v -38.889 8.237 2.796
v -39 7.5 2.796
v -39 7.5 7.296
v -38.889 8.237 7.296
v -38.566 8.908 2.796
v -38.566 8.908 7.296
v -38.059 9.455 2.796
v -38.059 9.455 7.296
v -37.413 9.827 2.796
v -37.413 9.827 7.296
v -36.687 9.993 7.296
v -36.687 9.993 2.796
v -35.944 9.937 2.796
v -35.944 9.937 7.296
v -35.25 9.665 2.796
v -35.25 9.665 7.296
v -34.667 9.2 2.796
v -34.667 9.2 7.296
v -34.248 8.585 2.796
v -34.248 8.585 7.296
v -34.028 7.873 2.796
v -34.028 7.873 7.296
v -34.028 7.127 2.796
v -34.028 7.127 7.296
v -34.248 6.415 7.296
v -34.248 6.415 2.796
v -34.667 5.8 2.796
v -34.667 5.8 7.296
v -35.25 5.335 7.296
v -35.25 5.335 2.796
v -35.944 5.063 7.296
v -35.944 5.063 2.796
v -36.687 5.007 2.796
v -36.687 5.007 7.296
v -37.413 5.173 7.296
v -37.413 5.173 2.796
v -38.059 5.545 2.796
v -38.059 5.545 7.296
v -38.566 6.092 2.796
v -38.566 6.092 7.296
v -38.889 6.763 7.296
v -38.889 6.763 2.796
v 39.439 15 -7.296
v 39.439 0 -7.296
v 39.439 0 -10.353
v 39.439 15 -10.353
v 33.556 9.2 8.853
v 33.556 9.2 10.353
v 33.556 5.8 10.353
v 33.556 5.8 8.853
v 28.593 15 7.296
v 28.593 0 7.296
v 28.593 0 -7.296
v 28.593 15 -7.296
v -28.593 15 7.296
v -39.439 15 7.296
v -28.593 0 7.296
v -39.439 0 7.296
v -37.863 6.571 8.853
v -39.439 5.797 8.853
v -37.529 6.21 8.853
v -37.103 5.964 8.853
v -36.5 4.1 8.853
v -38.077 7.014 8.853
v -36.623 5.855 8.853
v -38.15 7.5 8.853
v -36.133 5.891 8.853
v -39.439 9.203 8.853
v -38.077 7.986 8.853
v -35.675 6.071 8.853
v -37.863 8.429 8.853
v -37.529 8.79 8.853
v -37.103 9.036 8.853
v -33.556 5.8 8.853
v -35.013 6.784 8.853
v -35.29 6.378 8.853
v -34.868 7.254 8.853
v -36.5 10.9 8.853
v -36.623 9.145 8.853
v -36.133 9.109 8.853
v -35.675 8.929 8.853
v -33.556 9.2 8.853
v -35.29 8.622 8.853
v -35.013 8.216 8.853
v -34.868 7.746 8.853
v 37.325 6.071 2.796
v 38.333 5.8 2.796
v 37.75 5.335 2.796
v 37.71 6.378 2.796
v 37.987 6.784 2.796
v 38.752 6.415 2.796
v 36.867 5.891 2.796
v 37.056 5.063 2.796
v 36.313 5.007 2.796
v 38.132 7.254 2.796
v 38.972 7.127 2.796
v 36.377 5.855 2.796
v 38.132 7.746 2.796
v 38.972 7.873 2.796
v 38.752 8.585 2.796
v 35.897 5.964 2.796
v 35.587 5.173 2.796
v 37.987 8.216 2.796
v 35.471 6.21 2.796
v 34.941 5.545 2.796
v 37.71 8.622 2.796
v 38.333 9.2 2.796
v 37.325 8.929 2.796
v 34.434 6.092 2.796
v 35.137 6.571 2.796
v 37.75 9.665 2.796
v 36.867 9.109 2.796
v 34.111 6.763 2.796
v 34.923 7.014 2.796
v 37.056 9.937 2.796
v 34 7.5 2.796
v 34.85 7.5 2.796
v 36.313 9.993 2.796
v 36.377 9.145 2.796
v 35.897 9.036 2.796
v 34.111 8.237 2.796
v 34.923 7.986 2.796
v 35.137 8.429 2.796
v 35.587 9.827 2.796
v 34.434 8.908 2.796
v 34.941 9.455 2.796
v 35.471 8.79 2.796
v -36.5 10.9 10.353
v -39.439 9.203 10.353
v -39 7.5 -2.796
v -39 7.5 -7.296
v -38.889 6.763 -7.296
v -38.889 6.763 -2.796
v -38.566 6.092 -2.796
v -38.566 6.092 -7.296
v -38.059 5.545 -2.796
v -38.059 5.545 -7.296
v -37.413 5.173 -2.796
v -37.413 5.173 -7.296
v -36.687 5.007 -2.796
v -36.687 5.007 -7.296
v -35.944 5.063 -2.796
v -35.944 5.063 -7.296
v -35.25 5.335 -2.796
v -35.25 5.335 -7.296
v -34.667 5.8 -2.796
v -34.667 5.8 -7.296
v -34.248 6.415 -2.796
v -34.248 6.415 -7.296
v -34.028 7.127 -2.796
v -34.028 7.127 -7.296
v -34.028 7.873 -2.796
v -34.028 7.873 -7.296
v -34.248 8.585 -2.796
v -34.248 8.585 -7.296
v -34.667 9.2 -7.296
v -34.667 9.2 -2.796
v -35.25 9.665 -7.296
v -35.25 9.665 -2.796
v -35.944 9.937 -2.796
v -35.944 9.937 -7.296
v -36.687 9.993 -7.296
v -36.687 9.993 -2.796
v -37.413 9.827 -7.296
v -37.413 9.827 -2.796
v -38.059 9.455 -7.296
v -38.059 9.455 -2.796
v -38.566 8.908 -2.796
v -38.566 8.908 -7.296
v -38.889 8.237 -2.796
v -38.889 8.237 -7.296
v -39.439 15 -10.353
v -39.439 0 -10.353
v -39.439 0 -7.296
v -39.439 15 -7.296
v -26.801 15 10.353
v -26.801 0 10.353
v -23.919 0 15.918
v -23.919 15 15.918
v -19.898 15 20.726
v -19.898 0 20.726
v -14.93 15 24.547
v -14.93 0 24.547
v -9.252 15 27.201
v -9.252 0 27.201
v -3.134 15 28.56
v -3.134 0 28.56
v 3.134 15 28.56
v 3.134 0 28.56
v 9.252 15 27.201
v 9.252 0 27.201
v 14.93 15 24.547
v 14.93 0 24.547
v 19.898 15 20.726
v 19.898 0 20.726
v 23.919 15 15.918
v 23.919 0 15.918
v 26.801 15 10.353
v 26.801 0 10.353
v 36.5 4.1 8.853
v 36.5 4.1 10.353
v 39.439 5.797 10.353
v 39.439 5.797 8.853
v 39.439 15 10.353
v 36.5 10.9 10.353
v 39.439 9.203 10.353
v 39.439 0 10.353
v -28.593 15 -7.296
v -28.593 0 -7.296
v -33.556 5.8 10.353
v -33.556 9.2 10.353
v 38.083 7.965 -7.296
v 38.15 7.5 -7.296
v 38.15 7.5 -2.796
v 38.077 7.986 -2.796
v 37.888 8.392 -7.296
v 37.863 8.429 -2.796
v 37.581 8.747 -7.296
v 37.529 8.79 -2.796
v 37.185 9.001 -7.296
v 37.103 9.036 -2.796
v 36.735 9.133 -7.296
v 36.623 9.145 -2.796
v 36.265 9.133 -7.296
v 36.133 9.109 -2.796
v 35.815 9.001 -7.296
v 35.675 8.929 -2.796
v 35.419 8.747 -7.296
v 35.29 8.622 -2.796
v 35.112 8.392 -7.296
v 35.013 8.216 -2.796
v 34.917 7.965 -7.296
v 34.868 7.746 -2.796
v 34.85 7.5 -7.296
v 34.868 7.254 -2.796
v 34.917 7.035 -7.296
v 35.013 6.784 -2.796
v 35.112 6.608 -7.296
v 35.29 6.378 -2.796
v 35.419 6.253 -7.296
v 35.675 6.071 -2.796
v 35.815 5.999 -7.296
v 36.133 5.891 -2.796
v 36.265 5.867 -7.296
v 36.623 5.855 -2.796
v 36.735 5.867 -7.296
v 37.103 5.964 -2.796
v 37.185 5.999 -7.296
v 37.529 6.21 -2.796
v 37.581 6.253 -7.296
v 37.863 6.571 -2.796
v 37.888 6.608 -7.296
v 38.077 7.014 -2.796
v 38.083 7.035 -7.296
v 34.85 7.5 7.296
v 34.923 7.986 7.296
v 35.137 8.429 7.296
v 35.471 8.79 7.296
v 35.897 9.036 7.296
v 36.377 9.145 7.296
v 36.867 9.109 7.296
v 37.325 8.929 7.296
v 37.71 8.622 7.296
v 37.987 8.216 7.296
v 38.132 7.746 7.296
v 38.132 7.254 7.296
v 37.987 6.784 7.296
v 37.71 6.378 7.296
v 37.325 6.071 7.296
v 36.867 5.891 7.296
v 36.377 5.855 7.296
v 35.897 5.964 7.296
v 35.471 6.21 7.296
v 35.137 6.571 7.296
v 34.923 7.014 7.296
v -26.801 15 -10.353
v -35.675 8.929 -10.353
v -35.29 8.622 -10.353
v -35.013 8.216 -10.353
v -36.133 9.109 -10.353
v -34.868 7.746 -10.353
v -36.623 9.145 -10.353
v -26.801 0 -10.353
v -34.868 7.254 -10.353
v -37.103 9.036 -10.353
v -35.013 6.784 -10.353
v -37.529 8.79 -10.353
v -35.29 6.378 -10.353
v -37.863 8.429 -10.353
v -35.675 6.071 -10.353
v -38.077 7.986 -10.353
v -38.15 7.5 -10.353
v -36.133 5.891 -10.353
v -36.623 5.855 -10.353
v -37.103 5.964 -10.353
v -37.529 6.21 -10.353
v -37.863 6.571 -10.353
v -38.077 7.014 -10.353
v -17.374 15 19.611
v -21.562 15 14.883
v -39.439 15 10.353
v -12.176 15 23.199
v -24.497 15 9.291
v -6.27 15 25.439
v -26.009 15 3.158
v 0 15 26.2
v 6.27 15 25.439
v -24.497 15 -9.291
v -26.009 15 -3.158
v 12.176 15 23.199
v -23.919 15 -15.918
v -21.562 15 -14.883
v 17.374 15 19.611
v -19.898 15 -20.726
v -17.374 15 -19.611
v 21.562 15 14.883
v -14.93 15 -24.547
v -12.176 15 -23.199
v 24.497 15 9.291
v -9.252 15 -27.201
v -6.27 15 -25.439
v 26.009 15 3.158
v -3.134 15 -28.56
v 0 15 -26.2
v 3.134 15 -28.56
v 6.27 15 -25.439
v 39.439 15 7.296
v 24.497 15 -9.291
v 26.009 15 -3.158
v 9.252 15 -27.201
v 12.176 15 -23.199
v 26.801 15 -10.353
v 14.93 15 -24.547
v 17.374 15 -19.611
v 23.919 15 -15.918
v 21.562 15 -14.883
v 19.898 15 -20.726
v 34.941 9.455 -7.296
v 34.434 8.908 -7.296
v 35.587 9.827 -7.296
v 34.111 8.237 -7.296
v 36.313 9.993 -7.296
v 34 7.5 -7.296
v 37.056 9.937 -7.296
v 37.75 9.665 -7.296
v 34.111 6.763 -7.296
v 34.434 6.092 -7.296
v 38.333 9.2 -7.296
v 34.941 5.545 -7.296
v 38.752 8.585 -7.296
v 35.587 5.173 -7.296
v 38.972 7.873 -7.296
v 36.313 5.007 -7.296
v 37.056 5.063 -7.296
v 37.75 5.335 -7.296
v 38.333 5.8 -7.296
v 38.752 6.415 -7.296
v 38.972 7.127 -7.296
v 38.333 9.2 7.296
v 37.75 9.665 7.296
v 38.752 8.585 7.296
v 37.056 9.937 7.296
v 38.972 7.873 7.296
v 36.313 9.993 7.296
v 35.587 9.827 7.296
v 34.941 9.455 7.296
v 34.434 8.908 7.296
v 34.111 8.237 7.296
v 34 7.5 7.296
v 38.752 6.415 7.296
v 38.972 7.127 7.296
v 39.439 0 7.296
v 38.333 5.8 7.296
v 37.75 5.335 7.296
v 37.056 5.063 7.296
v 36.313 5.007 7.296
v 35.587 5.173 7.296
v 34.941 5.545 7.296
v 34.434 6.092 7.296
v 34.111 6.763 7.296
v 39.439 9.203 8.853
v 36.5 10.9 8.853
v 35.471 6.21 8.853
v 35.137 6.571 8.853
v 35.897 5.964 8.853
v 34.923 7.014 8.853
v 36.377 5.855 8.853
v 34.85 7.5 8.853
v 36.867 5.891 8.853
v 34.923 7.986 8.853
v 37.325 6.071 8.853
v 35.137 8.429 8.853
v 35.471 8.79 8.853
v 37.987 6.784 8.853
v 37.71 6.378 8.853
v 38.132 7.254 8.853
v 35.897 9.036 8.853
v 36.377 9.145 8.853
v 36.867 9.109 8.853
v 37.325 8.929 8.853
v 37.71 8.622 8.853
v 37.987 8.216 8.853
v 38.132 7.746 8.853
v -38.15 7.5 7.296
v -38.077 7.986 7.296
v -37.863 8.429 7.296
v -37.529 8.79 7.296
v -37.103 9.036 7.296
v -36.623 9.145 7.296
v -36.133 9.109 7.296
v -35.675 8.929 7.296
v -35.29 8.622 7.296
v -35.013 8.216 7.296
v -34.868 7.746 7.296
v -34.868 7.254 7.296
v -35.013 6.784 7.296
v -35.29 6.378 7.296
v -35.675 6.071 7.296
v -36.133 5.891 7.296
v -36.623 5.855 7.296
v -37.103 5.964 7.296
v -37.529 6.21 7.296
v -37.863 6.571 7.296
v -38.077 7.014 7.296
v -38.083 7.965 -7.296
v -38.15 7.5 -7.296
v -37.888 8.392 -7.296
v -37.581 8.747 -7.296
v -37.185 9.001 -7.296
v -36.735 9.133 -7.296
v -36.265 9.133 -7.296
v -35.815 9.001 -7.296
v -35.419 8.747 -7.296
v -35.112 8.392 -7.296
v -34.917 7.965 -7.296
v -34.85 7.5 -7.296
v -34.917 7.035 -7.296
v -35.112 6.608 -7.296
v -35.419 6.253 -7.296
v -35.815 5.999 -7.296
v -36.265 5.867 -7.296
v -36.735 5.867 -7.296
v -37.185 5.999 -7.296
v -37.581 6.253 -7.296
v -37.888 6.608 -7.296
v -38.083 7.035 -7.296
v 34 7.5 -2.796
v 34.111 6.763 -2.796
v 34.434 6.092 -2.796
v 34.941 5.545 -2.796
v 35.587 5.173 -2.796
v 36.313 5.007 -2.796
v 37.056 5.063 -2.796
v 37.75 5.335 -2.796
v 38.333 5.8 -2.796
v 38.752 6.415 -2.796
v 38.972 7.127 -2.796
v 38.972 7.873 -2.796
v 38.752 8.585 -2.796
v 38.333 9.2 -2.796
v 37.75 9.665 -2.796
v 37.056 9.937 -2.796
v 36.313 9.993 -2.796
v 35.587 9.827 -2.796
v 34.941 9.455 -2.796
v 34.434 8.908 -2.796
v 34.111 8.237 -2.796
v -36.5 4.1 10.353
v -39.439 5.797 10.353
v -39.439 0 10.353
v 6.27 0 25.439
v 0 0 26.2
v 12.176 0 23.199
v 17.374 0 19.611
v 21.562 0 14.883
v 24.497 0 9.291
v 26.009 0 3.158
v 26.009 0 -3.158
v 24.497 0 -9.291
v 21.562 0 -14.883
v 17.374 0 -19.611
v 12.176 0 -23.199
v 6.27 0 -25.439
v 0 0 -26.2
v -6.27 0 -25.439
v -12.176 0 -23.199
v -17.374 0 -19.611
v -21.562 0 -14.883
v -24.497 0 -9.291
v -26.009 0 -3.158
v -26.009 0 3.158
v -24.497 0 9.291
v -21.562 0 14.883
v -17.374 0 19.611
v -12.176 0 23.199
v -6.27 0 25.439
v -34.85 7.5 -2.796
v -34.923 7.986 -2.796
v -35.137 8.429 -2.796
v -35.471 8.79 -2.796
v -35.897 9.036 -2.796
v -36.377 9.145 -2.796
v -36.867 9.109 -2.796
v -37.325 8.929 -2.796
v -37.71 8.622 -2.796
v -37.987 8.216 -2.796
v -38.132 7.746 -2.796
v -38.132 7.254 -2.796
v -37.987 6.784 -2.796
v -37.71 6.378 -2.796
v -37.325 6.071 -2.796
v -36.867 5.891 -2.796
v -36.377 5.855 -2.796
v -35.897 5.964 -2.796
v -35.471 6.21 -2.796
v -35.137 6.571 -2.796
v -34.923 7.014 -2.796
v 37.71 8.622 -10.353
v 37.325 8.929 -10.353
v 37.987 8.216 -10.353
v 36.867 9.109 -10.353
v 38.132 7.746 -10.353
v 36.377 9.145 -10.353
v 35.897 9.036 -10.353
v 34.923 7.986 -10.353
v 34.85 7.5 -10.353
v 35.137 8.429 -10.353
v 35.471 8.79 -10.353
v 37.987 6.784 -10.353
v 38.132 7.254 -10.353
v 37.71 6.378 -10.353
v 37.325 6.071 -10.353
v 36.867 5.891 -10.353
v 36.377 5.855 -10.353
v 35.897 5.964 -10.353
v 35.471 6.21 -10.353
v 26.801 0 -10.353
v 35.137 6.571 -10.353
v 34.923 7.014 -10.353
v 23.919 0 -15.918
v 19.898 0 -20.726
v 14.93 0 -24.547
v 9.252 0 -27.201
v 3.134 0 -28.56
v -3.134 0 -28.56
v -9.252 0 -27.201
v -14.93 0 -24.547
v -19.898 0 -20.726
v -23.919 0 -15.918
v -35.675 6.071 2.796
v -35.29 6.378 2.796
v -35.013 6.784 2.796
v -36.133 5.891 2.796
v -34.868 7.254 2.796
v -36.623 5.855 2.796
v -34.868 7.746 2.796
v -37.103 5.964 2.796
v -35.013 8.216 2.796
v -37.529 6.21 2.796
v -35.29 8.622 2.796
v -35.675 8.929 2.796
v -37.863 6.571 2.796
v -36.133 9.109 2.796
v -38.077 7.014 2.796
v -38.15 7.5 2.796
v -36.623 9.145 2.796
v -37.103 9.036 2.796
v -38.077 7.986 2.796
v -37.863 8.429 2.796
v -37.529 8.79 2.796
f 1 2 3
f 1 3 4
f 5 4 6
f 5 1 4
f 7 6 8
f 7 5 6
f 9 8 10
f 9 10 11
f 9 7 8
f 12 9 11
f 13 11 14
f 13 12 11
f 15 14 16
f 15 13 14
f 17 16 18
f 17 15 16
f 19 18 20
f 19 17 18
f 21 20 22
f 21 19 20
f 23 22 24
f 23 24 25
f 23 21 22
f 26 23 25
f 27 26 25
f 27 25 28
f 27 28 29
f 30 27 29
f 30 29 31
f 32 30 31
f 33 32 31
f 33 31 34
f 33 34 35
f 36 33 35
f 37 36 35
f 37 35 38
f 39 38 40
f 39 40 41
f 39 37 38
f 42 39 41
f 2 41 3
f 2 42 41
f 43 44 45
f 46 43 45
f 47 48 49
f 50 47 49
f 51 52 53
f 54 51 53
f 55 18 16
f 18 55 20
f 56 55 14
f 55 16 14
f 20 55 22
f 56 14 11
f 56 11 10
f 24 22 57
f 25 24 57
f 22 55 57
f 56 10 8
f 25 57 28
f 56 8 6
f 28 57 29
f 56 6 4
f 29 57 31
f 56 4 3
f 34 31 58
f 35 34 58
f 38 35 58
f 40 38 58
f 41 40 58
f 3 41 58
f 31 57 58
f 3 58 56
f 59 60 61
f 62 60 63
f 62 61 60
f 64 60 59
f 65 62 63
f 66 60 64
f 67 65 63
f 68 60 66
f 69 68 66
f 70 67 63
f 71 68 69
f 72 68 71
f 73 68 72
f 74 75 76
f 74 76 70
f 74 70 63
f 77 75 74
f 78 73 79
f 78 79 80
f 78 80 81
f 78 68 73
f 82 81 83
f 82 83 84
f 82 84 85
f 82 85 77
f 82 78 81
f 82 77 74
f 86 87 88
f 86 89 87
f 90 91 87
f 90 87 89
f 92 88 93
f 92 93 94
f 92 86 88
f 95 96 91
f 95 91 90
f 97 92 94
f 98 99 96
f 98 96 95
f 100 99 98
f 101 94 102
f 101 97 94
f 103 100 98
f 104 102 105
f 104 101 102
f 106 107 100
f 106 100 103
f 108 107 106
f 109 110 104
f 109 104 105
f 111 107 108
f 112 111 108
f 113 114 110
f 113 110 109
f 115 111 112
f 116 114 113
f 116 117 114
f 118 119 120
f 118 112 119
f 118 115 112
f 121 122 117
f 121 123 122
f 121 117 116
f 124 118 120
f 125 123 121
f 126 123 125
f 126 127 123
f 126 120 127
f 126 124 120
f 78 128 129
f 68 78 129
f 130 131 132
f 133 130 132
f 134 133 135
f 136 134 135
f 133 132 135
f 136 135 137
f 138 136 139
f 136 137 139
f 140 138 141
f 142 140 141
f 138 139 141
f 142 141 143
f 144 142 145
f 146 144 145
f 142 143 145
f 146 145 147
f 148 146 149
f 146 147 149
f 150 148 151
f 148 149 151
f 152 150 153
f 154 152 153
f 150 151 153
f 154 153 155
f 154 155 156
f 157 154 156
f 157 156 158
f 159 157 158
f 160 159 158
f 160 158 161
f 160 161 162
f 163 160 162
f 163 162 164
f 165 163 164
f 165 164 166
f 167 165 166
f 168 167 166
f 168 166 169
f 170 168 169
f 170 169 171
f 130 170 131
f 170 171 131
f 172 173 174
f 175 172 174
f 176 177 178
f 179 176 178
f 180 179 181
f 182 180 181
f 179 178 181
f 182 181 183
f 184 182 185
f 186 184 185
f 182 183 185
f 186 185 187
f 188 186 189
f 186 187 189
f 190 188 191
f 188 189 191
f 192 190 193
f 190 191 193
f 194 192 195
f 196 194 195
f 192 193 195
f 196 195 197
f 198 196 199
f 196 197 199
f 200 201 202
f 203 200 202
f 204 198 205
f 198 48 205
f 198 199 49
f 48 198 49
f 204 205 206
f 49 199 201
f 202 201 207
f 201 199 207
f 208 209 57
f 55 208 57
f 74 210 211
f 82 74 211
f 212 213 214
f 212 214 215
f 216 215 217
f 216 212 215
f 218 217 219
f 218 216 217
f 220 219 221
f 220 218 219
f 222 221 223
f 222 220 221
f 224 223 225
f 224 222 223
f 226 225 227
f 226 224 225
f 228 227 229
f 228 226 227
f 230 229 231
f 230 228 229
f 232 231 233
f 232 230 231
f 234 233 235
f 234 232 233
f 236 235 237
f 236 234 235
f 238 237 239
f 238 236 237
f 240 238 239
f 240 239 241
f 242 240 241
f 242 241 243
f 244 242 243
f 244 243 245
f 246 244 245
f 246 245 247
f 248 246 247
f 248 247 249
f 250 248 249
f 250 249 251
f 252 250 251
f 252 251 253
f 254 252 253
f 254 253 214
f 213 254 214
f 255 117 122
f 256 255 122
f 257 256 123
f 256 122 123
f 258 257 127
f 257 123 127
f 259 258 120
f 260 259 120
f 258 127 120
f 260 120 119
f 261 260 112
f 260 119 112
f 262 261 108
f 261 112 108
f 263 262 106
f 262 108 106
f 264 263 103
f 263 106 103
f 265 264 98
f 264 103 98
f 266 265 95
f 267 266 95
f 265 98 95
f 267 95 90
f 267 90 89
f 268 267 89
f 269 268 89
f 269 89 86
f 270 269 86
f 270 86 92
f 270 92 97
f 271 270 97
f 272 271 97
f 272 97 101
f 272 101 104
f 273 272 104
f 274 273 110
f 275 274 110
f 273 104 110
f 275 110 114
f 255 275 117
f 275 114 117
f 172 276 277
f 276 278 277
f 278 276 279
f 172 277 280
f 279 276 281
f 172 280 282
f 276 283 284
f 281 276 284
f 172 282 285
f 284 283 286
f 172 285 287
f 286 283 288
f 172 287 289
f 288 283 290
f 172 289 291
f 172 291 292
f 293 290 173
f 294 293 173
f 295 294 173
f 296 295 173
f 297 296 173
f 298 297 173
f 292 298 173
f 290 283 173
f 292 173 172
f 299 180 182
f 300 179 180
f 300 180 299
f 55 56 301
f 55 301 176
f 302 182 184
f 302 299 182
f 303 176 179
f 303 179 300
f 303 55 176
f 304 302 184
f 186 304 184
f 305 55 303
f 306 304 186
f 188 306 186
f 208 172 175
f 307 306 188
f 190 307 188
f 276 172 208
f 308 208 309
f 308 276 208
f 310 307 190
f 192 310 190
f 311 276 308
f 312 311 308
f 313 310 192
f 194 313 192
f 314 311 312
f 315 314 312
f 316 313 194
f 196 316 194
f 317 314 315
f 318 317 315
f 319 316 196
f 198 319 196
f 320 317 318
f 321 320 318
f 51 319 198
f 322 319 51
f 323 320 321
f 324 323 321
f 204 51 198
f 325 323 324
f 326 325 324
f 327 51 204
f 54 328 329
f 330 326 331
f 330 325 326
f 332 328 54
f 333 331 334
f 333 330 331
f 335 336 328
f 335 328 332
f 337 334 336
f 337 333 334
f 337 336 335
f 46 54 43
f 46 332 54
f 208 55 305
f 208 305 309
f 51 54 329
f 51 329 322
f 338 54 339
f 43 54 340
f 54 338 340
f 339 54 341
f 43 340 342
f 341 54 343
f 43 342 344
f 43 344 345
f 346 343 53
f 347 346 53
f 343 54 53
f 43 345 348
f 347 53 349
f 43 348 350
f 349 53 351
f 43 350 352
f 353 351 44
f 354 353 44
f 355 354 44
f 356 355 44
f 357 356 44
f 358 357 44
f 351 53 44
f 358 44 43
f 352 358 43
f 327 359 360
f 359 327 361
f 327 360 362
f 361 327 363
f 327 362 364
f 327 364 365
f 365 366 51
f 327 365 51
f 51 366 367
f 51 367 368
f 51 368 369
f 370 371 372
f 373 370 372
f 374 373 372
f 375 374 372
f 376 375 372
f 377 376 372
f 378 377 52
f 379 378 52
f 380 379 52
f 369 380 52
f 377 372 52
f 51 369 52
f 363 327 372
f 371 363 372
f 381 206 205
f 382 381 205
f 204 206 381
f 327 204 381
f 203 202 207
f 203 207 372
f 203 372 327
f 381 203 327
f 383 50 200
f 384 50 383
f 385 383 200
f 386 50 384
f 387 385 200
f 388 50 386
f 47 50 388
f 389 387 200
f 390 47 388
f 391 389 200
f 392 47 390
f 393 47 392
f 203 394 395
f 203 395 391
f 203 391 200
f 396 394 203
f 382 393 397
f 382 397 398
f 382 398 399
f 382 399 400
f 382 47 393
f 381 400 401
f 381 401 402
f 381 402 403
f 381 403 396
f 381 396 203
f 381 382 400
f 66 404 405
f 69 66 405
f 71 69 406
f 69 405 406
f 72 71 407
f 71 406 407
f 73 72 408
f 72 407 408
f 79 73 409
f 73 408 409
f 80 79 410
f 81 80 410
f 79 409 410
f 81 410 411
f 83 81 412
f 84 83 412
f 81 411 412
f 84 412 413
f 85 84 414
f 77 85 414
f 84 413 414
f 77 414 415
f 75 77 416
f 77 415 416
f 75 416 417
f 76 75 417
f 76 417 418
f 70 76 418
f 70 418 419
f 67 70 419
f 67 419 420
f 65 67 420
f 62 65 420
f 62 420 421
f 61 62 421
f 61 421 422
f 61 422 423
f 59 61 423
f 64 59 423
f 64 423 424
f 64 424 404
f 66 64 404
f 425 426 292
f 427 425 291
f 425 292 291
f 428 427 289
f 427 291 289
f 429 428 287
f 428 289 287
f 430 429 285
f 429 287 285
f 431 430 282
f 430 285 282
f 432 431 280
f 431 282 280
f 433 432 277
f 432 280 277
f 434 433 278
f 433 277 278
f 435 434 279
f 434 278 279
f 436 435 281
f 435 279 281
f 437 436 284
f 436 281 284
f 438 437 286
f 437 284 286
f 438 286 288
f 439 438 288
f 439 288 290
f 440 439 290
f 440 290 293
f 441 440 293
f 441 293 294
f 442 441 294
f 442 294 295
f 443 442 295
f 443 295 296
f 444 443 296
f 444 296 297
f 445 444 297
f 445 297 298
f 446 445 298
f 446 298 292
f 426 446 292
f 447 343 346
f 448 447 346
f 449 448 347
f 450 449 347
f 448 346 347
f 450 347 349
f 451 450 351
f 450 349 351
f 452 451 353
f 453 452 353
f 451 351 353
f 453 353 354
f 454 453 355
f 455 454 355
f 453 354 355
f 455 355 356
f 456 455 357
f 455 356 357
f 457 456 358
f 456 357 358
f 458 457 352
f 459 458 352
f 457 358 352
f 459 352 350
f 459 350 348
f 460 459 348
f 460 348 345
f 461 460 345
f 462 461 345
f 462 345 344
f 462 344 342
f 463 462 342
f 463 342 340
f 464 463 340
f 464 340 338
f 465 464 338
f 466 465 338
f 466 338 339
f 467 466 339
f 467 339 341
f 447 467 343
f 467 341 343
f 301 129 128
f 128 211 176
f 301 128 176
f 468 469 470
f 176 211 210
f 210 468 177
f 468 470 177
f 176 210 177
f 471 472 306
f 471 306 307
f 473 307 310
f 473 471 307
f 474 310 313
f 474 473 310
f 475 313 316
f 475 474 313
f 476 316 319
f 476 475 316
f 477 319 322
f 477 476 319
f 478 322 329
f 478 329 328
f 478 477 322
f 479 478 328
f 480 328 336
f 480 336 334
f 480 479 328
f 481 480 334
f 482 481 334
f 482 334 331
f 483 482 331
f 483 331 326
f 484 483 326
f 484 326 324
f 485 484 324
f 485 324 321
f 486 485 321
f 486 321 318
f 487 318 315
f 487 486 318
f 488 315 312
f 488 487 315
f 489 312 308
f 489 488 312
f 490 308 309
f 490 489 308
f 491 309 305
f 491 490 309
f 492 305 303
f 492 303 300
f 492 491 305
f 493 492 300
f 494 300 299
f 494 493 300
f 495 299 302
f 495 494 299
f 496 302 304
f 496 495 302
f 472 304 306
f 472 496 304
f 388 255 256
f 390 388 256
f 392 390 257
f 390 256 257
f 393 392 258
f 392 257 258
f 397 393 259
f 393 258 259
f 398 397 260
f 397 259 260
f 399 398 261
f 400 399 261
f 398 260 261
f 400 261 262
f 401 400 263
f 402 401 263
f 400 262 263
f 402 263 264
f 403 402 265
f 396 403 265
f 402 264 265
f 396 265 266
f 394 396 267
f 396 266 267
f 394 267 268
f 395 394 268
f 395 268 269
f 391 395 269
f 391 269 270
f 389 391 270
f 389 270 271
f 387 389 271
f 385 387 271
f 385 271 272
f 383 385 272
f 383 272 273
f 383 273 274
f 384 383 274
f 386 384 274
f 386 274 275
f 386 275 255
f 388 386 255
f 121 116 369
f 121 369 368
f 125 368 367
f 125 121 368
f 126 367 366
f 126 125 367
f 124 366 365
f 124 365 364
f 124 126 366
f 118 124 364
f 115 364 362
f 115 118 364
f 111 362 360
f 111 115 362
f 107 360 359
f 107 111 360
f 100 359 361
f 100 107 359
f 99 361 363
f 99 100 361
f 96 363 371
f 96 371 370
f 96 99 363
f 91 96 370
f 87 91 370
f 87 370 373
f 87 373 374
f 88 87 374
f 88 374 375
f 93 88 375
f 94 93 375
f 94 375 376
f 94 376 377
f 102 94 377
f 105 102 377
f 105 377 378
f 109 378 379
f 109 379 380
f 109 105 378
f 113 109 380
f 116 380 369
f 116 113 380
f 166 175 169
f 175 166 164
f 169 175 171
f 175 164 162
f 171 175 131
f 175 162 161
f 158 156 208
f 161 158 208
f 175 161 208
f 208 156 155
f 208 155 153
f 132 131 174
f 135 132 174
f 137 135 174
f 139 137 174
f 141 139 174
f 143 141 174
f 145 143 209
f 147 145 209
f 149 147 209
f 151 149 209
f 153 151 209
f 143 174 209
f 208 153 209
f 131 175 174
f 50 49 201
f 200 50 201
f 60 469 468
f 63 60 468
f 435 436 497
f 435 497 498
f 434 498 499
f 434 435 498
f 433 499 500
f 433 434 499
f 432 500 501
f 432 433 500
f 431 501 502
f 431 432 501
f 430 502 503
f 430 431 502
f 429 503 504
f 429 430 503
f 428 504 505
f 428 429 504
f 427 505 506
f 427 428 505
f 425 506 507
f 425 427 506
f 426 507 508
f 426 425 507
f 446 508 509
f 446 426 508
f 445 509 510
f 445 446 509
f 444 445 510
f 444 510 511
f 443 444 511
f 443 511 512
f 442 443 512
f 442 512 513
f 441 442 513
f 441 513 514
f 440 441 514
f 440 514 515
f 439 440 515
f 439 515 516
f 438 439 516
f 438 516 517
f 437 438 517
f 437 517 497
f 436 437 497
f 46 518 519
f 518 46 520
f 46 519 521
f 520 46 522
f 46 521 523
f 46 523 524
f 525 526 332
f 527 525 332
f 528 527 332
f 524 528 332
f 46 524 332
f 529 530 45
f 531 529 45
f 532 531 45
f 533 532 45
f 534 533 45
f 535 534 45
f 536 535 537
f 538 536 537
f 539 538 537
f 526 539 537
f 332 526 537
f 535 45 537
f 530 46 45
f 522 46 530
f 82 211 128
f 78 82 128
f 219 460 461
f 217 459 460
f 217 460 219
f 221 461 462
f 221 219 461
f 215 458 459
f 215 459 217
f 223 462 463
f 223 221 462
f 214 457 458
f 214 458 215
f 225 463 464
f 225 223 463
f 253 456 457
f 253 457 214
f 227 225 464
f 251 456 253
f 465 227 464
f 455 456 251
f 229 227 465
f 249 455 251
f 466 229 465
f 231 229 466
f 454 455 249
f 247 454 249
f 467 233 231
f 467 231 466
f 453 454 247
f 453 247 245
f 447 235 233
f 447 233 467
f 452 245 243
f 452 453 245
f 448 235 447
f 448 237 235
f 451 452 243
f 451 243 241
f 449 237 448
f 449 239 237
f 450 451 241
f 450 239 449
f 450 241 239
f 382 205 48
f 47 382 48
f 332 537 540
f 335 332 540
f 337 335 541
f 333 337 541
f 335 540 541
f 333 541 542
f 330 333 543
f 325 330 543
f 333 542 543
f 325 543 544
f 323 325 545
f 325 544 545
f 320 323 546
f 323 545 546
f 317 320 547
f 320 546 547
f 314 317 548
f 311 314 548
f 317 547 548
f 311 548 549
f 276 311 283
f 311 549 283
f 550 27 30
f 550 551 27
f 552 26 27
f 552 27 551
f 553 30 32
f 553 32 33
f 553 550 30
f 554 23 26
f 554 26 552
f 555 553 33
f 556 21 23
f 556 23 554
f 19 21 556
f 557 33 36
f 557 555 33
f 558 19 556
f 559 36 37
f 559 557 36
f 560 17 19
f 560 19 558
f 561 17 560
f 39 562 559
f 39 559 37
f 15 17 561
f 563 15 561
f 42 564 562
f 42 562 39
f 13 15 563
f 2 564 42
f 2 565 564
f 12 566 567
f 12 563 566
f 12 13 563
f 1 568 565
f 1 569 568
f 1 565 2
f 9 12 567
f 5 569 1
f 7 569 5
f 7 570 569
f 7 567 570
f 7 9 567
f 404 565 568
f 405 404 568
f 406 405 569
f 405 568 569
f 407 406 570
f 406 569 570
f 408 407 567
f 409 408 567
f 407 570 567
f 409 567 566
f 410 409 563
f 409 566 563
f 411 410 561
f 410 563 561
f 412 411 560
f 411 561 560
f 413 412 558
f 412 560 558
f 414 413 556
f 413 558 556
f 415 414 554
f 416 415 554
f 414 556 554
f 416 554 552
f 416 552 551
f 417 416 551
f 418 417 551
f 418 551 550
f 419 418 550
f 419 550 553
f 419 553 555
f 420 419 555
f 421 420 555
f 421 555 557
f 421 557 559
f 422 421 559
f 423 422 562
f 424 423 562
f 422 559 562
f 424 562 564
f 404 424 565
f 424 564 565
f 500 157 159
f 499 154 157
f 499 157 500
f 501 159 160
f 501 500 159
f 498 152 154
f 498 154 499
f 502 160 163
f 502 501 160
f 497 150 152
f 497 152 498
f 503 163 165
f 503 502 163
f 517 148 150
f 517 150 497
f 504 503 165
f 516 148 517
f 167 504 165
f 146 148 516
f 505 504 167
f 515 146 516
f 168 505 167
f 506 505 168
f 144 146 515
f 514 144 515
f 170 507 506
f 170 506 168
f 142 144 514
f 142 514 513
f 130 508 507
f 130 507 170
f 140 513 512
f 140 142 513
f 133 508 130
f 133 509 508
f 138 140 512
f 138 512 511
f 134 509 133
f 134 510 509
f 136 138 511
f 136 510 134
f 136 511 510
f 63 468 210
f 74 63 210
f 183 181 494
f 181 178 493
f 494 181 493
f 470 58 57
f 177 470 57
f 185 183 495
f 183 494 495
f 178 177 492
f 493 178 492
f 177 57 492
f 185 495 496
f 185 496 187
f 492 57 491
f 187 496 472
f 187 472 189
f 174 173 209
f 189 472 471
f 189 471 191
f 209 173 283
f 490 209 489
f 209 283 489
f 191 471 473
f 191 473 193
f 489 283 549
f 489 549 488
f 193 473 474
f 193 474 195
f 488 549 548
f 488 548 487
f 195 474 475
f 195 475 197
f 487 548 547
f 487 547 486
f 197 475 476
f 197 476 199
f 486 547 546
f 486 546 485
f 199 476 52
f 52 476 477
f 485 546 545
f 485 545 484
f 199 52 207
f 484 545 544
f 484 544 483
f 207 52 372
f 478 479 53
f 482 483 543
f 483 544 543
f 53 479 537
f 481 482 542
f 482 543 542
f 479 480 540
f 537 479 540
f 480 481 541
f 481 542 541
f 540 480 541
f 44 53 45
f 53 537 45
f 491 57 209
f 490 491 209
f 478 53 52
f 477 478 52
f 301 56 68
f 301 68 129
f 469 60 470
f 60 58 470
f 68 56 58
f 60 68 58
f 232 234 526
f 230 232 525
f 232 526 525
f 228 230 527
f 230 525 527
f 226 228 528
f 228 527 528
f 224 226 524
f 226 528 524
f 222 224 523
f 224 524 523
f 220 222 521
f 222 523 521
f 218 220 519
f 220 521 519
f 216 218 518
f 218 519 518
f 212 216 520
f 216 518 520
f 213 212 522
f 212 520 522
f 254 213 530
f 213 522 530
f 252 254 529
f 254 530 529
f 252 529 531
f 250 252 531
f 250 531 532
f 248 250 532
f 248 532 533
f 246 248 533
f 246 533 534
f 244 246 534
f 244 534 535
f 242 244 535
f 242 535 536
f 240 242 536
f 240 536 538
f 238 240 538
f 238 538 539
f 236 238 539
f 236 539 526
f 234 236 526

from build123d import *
from build123d.topology import SkipClean

# Parameters (mm, degrees)
SKETCH_1_R          = 26.2
EXTRUDE_1_DEPTH     = 15
SKETCH_2_R          = 1.65
CUT_EXTRUDE_1_DEPTH = 23
CUT_EXTRUDE_2_DEPTH = 1.5
CUT_EXTRUDE_3_DEPTH = 1.5
SKETCH_5_R          = 2.5
SKETCH_5_R_2        = 1.65
EXTRUDE_2_DEPTH     = 4.5
EXTRUDE_START       = 4.5
SKETCH_6_R          = 2.5
SKETCH_6_R_2        = 1.65
EXTRUDE_3_DEPTH     = 4.5
SKETCH_7_R          = 2.5
SKETCH_7_R_2        = 1.65
EXTRUDE_4_DEPTH     = 4.5
SKETCH_8_R          = 2.5
SKETCH_8_R_2        = 1.65
EXTRUDE_5_DEPTH     = 4.5


with BuildPart() as part:
    # 草图1 → 凸台-拉伸1 (new body)
    with BuildSketch(Plane(origin=(0, 0, 0), x_dir=(1, 0, 0), z_dir=(0, 1, 0))):
        with BuildLine():
            Line((-39.438756162, 7.29616989), (-28.593098218, 7.29616989))
            Line((-28.593098218, 7.29616989), (-28.593098218, -7.29616989))
            Line((-28.593098218, -7.29616989), (-39.438756162, -7.29616989))
            Line((-39.438756162, -7.29616989), (-39.438756162, -10.352673493))
            Line((-39.438756162, -10.352673493), (-26.801123198, -10.352673493))
            ThreePointArc((-26.801123198, -10.352673493), (0, -28.731133864), (26.801123198, -10.352673493))
            Line((26.801123198, -10.352673493), (39.438756162, -10.352673493))
            Line((39.438756162, -10.352673493), (39.438756162, -7.29616989))
            Line((39.438756162, -7.29616989), (28.593098218, -7.29616989))
            Line((28.593098218, -7.29616989), (28.593098218, 7.29616989))
            Line((28.593098218, 7.29616989), (39.438756162, 7.29616989))
            Line((39.438756162, 7.29616989), (39.438756162, 10.352673493))
            Line((39.438756162, 10.352673493), (26.801123198, 10.352673493))
            ThreePointArc((26.801123198, 10.352673493), (0, 28.731133864), (-26.801123198, 10.352673493))
            Line((-26.801123198, 10.352673493), (-39.438756162, 10.352673493))
            Line((-39.438756162, 10.352673493), (-39.438756162, 7.29616989))
        make_face()
        with Locations(Location((0, 0, 0), (0, 0, 270))):
            Circle(SKETCH_1_R, mode=Mode.SUBTRACT)
    extrude(amount=EXTRUDE_1_DEPTH)

    # 草图2 → 切除-拉伸1 (cut)
    with BuildSketch(Plane(origin=(0, 0, -10.352673493), x_dir=(-1, 0, 0), z_dir=(0, 0, -1))):
        with Locations((36.5, 7.5)):
            Circle(SKETCH_2_R)
        with Locations((-36.5, 7.5)):
            Circle(SKETCH_2_R)
    extrude(amount=-CUT_EXTRUDE_1_DEPTH, mode=Mode.SUBTRACT)

    # 草图3 → 切除-拉伸2 (cut)
    with BuildSketch(Plane.XY.offset(10.352673493)):
        Polygon((-36.5, 4.1), (-33.555513627, 5.8), (-33.555513627, 9.2), (-36.5, 10.9), (-39.444486373, 9.2), (-39.444486373, 5.8), align=None)
    extrude(amount=-CUT_EXTRUDE_2_DEPTH, mode=Mode.SUBTRACT)

    # 草图4 → 切除-拉伸3 (cut)
    with BuildSketch(Plane.XY.offset(10.352673493)):
        Polygon((36.5, 4.1), (39.444486373, 5.8), (39.444486373, 9.2), (36.5, 10.9), (33.555513627, 9.2), (33.555513627, 5.8), align=None)
    extrude(amount=-CUT_EXTRUDE_3_DEPTH, mode=Mode.SUBTRACT)

    # 草图5 → 凸台-拉伸2 (add)
    with SkipClean():  # the faces are left unmerged after this step: merging them gives an invalid solid
        with BuildSketch(Plane.XY.offset(-7.29616989)):
            with Locations(Location((-36.5, 7.5, 0), (0, 0, 180))):
                Circle(SKETCH_5_R)
            with Locations((-36.5, 7.5)):
                Circle(SKETCH_5_R_2, mode=Mode.SUBTRACT)
        extrude(amount=EXTRUDE_2_DEPTH)

    # 草图6 → 凸台-拉伸3 (add)
    with SkipClean():  # the faces are left unmerged after this step: merging them gives an invalid solid
        with BuildSketch(Plane(origin=(0, 0, 7.29616989), x_dir=(-1, 0, 0), z_dir=(0, 0, -1)).offset(EXTRUDE_START)):
            with Locations((36.5, 7.5)):
                Circle(SKETCH_6_R)
            with Locations((36.5, 7.5)):
                Circle(SKETCH_6_R_2, mode=Mode.SUBTRACT)
        extrude(amount=-EXTRUDE_3_DEPTH)

    # 草图7 → 凸台-拉伸4 (add)
    with SkipClean():  # the faces are left unmerged after this step: merging them gives an invalid solid
        with BuildSketch(Plane.XY.offset(-7.29616989)):
            with Locations(Location((36.5, 7.5, 0), (0, 0, 180))):
                Circle(SKETCH_7_R)
            with Locations((36.5, 7.5)):
                Circle(SKETCH_7_R_2, mode=Mode.SUBTRACT)
        extrude(amount=EXTRUDE_4_DEPTH)

    # 草图8 → 凸台-拉伸5 (add)
    with SkipClean():  # the faces are left unmerged after this step: merging them gives an invalid solid
        with BuildSketch(Plane(origin=(0, 0, 7.29616989), x_dir=(-1, 0, 0), z_dir=(0, 0, -1)).offset(EXTRUDE_START)):
            with Locations((-36.5, 7.5)):
                Circle(SKETCH_8_R)
            with Locations((-36.5, 7.5)):
                Circle(SKETCH_8_R_2, mode=Mode.SUBTRACT)
        extrude(amount=-EXTRUDE_5_DEPTH)


solid = part.part
